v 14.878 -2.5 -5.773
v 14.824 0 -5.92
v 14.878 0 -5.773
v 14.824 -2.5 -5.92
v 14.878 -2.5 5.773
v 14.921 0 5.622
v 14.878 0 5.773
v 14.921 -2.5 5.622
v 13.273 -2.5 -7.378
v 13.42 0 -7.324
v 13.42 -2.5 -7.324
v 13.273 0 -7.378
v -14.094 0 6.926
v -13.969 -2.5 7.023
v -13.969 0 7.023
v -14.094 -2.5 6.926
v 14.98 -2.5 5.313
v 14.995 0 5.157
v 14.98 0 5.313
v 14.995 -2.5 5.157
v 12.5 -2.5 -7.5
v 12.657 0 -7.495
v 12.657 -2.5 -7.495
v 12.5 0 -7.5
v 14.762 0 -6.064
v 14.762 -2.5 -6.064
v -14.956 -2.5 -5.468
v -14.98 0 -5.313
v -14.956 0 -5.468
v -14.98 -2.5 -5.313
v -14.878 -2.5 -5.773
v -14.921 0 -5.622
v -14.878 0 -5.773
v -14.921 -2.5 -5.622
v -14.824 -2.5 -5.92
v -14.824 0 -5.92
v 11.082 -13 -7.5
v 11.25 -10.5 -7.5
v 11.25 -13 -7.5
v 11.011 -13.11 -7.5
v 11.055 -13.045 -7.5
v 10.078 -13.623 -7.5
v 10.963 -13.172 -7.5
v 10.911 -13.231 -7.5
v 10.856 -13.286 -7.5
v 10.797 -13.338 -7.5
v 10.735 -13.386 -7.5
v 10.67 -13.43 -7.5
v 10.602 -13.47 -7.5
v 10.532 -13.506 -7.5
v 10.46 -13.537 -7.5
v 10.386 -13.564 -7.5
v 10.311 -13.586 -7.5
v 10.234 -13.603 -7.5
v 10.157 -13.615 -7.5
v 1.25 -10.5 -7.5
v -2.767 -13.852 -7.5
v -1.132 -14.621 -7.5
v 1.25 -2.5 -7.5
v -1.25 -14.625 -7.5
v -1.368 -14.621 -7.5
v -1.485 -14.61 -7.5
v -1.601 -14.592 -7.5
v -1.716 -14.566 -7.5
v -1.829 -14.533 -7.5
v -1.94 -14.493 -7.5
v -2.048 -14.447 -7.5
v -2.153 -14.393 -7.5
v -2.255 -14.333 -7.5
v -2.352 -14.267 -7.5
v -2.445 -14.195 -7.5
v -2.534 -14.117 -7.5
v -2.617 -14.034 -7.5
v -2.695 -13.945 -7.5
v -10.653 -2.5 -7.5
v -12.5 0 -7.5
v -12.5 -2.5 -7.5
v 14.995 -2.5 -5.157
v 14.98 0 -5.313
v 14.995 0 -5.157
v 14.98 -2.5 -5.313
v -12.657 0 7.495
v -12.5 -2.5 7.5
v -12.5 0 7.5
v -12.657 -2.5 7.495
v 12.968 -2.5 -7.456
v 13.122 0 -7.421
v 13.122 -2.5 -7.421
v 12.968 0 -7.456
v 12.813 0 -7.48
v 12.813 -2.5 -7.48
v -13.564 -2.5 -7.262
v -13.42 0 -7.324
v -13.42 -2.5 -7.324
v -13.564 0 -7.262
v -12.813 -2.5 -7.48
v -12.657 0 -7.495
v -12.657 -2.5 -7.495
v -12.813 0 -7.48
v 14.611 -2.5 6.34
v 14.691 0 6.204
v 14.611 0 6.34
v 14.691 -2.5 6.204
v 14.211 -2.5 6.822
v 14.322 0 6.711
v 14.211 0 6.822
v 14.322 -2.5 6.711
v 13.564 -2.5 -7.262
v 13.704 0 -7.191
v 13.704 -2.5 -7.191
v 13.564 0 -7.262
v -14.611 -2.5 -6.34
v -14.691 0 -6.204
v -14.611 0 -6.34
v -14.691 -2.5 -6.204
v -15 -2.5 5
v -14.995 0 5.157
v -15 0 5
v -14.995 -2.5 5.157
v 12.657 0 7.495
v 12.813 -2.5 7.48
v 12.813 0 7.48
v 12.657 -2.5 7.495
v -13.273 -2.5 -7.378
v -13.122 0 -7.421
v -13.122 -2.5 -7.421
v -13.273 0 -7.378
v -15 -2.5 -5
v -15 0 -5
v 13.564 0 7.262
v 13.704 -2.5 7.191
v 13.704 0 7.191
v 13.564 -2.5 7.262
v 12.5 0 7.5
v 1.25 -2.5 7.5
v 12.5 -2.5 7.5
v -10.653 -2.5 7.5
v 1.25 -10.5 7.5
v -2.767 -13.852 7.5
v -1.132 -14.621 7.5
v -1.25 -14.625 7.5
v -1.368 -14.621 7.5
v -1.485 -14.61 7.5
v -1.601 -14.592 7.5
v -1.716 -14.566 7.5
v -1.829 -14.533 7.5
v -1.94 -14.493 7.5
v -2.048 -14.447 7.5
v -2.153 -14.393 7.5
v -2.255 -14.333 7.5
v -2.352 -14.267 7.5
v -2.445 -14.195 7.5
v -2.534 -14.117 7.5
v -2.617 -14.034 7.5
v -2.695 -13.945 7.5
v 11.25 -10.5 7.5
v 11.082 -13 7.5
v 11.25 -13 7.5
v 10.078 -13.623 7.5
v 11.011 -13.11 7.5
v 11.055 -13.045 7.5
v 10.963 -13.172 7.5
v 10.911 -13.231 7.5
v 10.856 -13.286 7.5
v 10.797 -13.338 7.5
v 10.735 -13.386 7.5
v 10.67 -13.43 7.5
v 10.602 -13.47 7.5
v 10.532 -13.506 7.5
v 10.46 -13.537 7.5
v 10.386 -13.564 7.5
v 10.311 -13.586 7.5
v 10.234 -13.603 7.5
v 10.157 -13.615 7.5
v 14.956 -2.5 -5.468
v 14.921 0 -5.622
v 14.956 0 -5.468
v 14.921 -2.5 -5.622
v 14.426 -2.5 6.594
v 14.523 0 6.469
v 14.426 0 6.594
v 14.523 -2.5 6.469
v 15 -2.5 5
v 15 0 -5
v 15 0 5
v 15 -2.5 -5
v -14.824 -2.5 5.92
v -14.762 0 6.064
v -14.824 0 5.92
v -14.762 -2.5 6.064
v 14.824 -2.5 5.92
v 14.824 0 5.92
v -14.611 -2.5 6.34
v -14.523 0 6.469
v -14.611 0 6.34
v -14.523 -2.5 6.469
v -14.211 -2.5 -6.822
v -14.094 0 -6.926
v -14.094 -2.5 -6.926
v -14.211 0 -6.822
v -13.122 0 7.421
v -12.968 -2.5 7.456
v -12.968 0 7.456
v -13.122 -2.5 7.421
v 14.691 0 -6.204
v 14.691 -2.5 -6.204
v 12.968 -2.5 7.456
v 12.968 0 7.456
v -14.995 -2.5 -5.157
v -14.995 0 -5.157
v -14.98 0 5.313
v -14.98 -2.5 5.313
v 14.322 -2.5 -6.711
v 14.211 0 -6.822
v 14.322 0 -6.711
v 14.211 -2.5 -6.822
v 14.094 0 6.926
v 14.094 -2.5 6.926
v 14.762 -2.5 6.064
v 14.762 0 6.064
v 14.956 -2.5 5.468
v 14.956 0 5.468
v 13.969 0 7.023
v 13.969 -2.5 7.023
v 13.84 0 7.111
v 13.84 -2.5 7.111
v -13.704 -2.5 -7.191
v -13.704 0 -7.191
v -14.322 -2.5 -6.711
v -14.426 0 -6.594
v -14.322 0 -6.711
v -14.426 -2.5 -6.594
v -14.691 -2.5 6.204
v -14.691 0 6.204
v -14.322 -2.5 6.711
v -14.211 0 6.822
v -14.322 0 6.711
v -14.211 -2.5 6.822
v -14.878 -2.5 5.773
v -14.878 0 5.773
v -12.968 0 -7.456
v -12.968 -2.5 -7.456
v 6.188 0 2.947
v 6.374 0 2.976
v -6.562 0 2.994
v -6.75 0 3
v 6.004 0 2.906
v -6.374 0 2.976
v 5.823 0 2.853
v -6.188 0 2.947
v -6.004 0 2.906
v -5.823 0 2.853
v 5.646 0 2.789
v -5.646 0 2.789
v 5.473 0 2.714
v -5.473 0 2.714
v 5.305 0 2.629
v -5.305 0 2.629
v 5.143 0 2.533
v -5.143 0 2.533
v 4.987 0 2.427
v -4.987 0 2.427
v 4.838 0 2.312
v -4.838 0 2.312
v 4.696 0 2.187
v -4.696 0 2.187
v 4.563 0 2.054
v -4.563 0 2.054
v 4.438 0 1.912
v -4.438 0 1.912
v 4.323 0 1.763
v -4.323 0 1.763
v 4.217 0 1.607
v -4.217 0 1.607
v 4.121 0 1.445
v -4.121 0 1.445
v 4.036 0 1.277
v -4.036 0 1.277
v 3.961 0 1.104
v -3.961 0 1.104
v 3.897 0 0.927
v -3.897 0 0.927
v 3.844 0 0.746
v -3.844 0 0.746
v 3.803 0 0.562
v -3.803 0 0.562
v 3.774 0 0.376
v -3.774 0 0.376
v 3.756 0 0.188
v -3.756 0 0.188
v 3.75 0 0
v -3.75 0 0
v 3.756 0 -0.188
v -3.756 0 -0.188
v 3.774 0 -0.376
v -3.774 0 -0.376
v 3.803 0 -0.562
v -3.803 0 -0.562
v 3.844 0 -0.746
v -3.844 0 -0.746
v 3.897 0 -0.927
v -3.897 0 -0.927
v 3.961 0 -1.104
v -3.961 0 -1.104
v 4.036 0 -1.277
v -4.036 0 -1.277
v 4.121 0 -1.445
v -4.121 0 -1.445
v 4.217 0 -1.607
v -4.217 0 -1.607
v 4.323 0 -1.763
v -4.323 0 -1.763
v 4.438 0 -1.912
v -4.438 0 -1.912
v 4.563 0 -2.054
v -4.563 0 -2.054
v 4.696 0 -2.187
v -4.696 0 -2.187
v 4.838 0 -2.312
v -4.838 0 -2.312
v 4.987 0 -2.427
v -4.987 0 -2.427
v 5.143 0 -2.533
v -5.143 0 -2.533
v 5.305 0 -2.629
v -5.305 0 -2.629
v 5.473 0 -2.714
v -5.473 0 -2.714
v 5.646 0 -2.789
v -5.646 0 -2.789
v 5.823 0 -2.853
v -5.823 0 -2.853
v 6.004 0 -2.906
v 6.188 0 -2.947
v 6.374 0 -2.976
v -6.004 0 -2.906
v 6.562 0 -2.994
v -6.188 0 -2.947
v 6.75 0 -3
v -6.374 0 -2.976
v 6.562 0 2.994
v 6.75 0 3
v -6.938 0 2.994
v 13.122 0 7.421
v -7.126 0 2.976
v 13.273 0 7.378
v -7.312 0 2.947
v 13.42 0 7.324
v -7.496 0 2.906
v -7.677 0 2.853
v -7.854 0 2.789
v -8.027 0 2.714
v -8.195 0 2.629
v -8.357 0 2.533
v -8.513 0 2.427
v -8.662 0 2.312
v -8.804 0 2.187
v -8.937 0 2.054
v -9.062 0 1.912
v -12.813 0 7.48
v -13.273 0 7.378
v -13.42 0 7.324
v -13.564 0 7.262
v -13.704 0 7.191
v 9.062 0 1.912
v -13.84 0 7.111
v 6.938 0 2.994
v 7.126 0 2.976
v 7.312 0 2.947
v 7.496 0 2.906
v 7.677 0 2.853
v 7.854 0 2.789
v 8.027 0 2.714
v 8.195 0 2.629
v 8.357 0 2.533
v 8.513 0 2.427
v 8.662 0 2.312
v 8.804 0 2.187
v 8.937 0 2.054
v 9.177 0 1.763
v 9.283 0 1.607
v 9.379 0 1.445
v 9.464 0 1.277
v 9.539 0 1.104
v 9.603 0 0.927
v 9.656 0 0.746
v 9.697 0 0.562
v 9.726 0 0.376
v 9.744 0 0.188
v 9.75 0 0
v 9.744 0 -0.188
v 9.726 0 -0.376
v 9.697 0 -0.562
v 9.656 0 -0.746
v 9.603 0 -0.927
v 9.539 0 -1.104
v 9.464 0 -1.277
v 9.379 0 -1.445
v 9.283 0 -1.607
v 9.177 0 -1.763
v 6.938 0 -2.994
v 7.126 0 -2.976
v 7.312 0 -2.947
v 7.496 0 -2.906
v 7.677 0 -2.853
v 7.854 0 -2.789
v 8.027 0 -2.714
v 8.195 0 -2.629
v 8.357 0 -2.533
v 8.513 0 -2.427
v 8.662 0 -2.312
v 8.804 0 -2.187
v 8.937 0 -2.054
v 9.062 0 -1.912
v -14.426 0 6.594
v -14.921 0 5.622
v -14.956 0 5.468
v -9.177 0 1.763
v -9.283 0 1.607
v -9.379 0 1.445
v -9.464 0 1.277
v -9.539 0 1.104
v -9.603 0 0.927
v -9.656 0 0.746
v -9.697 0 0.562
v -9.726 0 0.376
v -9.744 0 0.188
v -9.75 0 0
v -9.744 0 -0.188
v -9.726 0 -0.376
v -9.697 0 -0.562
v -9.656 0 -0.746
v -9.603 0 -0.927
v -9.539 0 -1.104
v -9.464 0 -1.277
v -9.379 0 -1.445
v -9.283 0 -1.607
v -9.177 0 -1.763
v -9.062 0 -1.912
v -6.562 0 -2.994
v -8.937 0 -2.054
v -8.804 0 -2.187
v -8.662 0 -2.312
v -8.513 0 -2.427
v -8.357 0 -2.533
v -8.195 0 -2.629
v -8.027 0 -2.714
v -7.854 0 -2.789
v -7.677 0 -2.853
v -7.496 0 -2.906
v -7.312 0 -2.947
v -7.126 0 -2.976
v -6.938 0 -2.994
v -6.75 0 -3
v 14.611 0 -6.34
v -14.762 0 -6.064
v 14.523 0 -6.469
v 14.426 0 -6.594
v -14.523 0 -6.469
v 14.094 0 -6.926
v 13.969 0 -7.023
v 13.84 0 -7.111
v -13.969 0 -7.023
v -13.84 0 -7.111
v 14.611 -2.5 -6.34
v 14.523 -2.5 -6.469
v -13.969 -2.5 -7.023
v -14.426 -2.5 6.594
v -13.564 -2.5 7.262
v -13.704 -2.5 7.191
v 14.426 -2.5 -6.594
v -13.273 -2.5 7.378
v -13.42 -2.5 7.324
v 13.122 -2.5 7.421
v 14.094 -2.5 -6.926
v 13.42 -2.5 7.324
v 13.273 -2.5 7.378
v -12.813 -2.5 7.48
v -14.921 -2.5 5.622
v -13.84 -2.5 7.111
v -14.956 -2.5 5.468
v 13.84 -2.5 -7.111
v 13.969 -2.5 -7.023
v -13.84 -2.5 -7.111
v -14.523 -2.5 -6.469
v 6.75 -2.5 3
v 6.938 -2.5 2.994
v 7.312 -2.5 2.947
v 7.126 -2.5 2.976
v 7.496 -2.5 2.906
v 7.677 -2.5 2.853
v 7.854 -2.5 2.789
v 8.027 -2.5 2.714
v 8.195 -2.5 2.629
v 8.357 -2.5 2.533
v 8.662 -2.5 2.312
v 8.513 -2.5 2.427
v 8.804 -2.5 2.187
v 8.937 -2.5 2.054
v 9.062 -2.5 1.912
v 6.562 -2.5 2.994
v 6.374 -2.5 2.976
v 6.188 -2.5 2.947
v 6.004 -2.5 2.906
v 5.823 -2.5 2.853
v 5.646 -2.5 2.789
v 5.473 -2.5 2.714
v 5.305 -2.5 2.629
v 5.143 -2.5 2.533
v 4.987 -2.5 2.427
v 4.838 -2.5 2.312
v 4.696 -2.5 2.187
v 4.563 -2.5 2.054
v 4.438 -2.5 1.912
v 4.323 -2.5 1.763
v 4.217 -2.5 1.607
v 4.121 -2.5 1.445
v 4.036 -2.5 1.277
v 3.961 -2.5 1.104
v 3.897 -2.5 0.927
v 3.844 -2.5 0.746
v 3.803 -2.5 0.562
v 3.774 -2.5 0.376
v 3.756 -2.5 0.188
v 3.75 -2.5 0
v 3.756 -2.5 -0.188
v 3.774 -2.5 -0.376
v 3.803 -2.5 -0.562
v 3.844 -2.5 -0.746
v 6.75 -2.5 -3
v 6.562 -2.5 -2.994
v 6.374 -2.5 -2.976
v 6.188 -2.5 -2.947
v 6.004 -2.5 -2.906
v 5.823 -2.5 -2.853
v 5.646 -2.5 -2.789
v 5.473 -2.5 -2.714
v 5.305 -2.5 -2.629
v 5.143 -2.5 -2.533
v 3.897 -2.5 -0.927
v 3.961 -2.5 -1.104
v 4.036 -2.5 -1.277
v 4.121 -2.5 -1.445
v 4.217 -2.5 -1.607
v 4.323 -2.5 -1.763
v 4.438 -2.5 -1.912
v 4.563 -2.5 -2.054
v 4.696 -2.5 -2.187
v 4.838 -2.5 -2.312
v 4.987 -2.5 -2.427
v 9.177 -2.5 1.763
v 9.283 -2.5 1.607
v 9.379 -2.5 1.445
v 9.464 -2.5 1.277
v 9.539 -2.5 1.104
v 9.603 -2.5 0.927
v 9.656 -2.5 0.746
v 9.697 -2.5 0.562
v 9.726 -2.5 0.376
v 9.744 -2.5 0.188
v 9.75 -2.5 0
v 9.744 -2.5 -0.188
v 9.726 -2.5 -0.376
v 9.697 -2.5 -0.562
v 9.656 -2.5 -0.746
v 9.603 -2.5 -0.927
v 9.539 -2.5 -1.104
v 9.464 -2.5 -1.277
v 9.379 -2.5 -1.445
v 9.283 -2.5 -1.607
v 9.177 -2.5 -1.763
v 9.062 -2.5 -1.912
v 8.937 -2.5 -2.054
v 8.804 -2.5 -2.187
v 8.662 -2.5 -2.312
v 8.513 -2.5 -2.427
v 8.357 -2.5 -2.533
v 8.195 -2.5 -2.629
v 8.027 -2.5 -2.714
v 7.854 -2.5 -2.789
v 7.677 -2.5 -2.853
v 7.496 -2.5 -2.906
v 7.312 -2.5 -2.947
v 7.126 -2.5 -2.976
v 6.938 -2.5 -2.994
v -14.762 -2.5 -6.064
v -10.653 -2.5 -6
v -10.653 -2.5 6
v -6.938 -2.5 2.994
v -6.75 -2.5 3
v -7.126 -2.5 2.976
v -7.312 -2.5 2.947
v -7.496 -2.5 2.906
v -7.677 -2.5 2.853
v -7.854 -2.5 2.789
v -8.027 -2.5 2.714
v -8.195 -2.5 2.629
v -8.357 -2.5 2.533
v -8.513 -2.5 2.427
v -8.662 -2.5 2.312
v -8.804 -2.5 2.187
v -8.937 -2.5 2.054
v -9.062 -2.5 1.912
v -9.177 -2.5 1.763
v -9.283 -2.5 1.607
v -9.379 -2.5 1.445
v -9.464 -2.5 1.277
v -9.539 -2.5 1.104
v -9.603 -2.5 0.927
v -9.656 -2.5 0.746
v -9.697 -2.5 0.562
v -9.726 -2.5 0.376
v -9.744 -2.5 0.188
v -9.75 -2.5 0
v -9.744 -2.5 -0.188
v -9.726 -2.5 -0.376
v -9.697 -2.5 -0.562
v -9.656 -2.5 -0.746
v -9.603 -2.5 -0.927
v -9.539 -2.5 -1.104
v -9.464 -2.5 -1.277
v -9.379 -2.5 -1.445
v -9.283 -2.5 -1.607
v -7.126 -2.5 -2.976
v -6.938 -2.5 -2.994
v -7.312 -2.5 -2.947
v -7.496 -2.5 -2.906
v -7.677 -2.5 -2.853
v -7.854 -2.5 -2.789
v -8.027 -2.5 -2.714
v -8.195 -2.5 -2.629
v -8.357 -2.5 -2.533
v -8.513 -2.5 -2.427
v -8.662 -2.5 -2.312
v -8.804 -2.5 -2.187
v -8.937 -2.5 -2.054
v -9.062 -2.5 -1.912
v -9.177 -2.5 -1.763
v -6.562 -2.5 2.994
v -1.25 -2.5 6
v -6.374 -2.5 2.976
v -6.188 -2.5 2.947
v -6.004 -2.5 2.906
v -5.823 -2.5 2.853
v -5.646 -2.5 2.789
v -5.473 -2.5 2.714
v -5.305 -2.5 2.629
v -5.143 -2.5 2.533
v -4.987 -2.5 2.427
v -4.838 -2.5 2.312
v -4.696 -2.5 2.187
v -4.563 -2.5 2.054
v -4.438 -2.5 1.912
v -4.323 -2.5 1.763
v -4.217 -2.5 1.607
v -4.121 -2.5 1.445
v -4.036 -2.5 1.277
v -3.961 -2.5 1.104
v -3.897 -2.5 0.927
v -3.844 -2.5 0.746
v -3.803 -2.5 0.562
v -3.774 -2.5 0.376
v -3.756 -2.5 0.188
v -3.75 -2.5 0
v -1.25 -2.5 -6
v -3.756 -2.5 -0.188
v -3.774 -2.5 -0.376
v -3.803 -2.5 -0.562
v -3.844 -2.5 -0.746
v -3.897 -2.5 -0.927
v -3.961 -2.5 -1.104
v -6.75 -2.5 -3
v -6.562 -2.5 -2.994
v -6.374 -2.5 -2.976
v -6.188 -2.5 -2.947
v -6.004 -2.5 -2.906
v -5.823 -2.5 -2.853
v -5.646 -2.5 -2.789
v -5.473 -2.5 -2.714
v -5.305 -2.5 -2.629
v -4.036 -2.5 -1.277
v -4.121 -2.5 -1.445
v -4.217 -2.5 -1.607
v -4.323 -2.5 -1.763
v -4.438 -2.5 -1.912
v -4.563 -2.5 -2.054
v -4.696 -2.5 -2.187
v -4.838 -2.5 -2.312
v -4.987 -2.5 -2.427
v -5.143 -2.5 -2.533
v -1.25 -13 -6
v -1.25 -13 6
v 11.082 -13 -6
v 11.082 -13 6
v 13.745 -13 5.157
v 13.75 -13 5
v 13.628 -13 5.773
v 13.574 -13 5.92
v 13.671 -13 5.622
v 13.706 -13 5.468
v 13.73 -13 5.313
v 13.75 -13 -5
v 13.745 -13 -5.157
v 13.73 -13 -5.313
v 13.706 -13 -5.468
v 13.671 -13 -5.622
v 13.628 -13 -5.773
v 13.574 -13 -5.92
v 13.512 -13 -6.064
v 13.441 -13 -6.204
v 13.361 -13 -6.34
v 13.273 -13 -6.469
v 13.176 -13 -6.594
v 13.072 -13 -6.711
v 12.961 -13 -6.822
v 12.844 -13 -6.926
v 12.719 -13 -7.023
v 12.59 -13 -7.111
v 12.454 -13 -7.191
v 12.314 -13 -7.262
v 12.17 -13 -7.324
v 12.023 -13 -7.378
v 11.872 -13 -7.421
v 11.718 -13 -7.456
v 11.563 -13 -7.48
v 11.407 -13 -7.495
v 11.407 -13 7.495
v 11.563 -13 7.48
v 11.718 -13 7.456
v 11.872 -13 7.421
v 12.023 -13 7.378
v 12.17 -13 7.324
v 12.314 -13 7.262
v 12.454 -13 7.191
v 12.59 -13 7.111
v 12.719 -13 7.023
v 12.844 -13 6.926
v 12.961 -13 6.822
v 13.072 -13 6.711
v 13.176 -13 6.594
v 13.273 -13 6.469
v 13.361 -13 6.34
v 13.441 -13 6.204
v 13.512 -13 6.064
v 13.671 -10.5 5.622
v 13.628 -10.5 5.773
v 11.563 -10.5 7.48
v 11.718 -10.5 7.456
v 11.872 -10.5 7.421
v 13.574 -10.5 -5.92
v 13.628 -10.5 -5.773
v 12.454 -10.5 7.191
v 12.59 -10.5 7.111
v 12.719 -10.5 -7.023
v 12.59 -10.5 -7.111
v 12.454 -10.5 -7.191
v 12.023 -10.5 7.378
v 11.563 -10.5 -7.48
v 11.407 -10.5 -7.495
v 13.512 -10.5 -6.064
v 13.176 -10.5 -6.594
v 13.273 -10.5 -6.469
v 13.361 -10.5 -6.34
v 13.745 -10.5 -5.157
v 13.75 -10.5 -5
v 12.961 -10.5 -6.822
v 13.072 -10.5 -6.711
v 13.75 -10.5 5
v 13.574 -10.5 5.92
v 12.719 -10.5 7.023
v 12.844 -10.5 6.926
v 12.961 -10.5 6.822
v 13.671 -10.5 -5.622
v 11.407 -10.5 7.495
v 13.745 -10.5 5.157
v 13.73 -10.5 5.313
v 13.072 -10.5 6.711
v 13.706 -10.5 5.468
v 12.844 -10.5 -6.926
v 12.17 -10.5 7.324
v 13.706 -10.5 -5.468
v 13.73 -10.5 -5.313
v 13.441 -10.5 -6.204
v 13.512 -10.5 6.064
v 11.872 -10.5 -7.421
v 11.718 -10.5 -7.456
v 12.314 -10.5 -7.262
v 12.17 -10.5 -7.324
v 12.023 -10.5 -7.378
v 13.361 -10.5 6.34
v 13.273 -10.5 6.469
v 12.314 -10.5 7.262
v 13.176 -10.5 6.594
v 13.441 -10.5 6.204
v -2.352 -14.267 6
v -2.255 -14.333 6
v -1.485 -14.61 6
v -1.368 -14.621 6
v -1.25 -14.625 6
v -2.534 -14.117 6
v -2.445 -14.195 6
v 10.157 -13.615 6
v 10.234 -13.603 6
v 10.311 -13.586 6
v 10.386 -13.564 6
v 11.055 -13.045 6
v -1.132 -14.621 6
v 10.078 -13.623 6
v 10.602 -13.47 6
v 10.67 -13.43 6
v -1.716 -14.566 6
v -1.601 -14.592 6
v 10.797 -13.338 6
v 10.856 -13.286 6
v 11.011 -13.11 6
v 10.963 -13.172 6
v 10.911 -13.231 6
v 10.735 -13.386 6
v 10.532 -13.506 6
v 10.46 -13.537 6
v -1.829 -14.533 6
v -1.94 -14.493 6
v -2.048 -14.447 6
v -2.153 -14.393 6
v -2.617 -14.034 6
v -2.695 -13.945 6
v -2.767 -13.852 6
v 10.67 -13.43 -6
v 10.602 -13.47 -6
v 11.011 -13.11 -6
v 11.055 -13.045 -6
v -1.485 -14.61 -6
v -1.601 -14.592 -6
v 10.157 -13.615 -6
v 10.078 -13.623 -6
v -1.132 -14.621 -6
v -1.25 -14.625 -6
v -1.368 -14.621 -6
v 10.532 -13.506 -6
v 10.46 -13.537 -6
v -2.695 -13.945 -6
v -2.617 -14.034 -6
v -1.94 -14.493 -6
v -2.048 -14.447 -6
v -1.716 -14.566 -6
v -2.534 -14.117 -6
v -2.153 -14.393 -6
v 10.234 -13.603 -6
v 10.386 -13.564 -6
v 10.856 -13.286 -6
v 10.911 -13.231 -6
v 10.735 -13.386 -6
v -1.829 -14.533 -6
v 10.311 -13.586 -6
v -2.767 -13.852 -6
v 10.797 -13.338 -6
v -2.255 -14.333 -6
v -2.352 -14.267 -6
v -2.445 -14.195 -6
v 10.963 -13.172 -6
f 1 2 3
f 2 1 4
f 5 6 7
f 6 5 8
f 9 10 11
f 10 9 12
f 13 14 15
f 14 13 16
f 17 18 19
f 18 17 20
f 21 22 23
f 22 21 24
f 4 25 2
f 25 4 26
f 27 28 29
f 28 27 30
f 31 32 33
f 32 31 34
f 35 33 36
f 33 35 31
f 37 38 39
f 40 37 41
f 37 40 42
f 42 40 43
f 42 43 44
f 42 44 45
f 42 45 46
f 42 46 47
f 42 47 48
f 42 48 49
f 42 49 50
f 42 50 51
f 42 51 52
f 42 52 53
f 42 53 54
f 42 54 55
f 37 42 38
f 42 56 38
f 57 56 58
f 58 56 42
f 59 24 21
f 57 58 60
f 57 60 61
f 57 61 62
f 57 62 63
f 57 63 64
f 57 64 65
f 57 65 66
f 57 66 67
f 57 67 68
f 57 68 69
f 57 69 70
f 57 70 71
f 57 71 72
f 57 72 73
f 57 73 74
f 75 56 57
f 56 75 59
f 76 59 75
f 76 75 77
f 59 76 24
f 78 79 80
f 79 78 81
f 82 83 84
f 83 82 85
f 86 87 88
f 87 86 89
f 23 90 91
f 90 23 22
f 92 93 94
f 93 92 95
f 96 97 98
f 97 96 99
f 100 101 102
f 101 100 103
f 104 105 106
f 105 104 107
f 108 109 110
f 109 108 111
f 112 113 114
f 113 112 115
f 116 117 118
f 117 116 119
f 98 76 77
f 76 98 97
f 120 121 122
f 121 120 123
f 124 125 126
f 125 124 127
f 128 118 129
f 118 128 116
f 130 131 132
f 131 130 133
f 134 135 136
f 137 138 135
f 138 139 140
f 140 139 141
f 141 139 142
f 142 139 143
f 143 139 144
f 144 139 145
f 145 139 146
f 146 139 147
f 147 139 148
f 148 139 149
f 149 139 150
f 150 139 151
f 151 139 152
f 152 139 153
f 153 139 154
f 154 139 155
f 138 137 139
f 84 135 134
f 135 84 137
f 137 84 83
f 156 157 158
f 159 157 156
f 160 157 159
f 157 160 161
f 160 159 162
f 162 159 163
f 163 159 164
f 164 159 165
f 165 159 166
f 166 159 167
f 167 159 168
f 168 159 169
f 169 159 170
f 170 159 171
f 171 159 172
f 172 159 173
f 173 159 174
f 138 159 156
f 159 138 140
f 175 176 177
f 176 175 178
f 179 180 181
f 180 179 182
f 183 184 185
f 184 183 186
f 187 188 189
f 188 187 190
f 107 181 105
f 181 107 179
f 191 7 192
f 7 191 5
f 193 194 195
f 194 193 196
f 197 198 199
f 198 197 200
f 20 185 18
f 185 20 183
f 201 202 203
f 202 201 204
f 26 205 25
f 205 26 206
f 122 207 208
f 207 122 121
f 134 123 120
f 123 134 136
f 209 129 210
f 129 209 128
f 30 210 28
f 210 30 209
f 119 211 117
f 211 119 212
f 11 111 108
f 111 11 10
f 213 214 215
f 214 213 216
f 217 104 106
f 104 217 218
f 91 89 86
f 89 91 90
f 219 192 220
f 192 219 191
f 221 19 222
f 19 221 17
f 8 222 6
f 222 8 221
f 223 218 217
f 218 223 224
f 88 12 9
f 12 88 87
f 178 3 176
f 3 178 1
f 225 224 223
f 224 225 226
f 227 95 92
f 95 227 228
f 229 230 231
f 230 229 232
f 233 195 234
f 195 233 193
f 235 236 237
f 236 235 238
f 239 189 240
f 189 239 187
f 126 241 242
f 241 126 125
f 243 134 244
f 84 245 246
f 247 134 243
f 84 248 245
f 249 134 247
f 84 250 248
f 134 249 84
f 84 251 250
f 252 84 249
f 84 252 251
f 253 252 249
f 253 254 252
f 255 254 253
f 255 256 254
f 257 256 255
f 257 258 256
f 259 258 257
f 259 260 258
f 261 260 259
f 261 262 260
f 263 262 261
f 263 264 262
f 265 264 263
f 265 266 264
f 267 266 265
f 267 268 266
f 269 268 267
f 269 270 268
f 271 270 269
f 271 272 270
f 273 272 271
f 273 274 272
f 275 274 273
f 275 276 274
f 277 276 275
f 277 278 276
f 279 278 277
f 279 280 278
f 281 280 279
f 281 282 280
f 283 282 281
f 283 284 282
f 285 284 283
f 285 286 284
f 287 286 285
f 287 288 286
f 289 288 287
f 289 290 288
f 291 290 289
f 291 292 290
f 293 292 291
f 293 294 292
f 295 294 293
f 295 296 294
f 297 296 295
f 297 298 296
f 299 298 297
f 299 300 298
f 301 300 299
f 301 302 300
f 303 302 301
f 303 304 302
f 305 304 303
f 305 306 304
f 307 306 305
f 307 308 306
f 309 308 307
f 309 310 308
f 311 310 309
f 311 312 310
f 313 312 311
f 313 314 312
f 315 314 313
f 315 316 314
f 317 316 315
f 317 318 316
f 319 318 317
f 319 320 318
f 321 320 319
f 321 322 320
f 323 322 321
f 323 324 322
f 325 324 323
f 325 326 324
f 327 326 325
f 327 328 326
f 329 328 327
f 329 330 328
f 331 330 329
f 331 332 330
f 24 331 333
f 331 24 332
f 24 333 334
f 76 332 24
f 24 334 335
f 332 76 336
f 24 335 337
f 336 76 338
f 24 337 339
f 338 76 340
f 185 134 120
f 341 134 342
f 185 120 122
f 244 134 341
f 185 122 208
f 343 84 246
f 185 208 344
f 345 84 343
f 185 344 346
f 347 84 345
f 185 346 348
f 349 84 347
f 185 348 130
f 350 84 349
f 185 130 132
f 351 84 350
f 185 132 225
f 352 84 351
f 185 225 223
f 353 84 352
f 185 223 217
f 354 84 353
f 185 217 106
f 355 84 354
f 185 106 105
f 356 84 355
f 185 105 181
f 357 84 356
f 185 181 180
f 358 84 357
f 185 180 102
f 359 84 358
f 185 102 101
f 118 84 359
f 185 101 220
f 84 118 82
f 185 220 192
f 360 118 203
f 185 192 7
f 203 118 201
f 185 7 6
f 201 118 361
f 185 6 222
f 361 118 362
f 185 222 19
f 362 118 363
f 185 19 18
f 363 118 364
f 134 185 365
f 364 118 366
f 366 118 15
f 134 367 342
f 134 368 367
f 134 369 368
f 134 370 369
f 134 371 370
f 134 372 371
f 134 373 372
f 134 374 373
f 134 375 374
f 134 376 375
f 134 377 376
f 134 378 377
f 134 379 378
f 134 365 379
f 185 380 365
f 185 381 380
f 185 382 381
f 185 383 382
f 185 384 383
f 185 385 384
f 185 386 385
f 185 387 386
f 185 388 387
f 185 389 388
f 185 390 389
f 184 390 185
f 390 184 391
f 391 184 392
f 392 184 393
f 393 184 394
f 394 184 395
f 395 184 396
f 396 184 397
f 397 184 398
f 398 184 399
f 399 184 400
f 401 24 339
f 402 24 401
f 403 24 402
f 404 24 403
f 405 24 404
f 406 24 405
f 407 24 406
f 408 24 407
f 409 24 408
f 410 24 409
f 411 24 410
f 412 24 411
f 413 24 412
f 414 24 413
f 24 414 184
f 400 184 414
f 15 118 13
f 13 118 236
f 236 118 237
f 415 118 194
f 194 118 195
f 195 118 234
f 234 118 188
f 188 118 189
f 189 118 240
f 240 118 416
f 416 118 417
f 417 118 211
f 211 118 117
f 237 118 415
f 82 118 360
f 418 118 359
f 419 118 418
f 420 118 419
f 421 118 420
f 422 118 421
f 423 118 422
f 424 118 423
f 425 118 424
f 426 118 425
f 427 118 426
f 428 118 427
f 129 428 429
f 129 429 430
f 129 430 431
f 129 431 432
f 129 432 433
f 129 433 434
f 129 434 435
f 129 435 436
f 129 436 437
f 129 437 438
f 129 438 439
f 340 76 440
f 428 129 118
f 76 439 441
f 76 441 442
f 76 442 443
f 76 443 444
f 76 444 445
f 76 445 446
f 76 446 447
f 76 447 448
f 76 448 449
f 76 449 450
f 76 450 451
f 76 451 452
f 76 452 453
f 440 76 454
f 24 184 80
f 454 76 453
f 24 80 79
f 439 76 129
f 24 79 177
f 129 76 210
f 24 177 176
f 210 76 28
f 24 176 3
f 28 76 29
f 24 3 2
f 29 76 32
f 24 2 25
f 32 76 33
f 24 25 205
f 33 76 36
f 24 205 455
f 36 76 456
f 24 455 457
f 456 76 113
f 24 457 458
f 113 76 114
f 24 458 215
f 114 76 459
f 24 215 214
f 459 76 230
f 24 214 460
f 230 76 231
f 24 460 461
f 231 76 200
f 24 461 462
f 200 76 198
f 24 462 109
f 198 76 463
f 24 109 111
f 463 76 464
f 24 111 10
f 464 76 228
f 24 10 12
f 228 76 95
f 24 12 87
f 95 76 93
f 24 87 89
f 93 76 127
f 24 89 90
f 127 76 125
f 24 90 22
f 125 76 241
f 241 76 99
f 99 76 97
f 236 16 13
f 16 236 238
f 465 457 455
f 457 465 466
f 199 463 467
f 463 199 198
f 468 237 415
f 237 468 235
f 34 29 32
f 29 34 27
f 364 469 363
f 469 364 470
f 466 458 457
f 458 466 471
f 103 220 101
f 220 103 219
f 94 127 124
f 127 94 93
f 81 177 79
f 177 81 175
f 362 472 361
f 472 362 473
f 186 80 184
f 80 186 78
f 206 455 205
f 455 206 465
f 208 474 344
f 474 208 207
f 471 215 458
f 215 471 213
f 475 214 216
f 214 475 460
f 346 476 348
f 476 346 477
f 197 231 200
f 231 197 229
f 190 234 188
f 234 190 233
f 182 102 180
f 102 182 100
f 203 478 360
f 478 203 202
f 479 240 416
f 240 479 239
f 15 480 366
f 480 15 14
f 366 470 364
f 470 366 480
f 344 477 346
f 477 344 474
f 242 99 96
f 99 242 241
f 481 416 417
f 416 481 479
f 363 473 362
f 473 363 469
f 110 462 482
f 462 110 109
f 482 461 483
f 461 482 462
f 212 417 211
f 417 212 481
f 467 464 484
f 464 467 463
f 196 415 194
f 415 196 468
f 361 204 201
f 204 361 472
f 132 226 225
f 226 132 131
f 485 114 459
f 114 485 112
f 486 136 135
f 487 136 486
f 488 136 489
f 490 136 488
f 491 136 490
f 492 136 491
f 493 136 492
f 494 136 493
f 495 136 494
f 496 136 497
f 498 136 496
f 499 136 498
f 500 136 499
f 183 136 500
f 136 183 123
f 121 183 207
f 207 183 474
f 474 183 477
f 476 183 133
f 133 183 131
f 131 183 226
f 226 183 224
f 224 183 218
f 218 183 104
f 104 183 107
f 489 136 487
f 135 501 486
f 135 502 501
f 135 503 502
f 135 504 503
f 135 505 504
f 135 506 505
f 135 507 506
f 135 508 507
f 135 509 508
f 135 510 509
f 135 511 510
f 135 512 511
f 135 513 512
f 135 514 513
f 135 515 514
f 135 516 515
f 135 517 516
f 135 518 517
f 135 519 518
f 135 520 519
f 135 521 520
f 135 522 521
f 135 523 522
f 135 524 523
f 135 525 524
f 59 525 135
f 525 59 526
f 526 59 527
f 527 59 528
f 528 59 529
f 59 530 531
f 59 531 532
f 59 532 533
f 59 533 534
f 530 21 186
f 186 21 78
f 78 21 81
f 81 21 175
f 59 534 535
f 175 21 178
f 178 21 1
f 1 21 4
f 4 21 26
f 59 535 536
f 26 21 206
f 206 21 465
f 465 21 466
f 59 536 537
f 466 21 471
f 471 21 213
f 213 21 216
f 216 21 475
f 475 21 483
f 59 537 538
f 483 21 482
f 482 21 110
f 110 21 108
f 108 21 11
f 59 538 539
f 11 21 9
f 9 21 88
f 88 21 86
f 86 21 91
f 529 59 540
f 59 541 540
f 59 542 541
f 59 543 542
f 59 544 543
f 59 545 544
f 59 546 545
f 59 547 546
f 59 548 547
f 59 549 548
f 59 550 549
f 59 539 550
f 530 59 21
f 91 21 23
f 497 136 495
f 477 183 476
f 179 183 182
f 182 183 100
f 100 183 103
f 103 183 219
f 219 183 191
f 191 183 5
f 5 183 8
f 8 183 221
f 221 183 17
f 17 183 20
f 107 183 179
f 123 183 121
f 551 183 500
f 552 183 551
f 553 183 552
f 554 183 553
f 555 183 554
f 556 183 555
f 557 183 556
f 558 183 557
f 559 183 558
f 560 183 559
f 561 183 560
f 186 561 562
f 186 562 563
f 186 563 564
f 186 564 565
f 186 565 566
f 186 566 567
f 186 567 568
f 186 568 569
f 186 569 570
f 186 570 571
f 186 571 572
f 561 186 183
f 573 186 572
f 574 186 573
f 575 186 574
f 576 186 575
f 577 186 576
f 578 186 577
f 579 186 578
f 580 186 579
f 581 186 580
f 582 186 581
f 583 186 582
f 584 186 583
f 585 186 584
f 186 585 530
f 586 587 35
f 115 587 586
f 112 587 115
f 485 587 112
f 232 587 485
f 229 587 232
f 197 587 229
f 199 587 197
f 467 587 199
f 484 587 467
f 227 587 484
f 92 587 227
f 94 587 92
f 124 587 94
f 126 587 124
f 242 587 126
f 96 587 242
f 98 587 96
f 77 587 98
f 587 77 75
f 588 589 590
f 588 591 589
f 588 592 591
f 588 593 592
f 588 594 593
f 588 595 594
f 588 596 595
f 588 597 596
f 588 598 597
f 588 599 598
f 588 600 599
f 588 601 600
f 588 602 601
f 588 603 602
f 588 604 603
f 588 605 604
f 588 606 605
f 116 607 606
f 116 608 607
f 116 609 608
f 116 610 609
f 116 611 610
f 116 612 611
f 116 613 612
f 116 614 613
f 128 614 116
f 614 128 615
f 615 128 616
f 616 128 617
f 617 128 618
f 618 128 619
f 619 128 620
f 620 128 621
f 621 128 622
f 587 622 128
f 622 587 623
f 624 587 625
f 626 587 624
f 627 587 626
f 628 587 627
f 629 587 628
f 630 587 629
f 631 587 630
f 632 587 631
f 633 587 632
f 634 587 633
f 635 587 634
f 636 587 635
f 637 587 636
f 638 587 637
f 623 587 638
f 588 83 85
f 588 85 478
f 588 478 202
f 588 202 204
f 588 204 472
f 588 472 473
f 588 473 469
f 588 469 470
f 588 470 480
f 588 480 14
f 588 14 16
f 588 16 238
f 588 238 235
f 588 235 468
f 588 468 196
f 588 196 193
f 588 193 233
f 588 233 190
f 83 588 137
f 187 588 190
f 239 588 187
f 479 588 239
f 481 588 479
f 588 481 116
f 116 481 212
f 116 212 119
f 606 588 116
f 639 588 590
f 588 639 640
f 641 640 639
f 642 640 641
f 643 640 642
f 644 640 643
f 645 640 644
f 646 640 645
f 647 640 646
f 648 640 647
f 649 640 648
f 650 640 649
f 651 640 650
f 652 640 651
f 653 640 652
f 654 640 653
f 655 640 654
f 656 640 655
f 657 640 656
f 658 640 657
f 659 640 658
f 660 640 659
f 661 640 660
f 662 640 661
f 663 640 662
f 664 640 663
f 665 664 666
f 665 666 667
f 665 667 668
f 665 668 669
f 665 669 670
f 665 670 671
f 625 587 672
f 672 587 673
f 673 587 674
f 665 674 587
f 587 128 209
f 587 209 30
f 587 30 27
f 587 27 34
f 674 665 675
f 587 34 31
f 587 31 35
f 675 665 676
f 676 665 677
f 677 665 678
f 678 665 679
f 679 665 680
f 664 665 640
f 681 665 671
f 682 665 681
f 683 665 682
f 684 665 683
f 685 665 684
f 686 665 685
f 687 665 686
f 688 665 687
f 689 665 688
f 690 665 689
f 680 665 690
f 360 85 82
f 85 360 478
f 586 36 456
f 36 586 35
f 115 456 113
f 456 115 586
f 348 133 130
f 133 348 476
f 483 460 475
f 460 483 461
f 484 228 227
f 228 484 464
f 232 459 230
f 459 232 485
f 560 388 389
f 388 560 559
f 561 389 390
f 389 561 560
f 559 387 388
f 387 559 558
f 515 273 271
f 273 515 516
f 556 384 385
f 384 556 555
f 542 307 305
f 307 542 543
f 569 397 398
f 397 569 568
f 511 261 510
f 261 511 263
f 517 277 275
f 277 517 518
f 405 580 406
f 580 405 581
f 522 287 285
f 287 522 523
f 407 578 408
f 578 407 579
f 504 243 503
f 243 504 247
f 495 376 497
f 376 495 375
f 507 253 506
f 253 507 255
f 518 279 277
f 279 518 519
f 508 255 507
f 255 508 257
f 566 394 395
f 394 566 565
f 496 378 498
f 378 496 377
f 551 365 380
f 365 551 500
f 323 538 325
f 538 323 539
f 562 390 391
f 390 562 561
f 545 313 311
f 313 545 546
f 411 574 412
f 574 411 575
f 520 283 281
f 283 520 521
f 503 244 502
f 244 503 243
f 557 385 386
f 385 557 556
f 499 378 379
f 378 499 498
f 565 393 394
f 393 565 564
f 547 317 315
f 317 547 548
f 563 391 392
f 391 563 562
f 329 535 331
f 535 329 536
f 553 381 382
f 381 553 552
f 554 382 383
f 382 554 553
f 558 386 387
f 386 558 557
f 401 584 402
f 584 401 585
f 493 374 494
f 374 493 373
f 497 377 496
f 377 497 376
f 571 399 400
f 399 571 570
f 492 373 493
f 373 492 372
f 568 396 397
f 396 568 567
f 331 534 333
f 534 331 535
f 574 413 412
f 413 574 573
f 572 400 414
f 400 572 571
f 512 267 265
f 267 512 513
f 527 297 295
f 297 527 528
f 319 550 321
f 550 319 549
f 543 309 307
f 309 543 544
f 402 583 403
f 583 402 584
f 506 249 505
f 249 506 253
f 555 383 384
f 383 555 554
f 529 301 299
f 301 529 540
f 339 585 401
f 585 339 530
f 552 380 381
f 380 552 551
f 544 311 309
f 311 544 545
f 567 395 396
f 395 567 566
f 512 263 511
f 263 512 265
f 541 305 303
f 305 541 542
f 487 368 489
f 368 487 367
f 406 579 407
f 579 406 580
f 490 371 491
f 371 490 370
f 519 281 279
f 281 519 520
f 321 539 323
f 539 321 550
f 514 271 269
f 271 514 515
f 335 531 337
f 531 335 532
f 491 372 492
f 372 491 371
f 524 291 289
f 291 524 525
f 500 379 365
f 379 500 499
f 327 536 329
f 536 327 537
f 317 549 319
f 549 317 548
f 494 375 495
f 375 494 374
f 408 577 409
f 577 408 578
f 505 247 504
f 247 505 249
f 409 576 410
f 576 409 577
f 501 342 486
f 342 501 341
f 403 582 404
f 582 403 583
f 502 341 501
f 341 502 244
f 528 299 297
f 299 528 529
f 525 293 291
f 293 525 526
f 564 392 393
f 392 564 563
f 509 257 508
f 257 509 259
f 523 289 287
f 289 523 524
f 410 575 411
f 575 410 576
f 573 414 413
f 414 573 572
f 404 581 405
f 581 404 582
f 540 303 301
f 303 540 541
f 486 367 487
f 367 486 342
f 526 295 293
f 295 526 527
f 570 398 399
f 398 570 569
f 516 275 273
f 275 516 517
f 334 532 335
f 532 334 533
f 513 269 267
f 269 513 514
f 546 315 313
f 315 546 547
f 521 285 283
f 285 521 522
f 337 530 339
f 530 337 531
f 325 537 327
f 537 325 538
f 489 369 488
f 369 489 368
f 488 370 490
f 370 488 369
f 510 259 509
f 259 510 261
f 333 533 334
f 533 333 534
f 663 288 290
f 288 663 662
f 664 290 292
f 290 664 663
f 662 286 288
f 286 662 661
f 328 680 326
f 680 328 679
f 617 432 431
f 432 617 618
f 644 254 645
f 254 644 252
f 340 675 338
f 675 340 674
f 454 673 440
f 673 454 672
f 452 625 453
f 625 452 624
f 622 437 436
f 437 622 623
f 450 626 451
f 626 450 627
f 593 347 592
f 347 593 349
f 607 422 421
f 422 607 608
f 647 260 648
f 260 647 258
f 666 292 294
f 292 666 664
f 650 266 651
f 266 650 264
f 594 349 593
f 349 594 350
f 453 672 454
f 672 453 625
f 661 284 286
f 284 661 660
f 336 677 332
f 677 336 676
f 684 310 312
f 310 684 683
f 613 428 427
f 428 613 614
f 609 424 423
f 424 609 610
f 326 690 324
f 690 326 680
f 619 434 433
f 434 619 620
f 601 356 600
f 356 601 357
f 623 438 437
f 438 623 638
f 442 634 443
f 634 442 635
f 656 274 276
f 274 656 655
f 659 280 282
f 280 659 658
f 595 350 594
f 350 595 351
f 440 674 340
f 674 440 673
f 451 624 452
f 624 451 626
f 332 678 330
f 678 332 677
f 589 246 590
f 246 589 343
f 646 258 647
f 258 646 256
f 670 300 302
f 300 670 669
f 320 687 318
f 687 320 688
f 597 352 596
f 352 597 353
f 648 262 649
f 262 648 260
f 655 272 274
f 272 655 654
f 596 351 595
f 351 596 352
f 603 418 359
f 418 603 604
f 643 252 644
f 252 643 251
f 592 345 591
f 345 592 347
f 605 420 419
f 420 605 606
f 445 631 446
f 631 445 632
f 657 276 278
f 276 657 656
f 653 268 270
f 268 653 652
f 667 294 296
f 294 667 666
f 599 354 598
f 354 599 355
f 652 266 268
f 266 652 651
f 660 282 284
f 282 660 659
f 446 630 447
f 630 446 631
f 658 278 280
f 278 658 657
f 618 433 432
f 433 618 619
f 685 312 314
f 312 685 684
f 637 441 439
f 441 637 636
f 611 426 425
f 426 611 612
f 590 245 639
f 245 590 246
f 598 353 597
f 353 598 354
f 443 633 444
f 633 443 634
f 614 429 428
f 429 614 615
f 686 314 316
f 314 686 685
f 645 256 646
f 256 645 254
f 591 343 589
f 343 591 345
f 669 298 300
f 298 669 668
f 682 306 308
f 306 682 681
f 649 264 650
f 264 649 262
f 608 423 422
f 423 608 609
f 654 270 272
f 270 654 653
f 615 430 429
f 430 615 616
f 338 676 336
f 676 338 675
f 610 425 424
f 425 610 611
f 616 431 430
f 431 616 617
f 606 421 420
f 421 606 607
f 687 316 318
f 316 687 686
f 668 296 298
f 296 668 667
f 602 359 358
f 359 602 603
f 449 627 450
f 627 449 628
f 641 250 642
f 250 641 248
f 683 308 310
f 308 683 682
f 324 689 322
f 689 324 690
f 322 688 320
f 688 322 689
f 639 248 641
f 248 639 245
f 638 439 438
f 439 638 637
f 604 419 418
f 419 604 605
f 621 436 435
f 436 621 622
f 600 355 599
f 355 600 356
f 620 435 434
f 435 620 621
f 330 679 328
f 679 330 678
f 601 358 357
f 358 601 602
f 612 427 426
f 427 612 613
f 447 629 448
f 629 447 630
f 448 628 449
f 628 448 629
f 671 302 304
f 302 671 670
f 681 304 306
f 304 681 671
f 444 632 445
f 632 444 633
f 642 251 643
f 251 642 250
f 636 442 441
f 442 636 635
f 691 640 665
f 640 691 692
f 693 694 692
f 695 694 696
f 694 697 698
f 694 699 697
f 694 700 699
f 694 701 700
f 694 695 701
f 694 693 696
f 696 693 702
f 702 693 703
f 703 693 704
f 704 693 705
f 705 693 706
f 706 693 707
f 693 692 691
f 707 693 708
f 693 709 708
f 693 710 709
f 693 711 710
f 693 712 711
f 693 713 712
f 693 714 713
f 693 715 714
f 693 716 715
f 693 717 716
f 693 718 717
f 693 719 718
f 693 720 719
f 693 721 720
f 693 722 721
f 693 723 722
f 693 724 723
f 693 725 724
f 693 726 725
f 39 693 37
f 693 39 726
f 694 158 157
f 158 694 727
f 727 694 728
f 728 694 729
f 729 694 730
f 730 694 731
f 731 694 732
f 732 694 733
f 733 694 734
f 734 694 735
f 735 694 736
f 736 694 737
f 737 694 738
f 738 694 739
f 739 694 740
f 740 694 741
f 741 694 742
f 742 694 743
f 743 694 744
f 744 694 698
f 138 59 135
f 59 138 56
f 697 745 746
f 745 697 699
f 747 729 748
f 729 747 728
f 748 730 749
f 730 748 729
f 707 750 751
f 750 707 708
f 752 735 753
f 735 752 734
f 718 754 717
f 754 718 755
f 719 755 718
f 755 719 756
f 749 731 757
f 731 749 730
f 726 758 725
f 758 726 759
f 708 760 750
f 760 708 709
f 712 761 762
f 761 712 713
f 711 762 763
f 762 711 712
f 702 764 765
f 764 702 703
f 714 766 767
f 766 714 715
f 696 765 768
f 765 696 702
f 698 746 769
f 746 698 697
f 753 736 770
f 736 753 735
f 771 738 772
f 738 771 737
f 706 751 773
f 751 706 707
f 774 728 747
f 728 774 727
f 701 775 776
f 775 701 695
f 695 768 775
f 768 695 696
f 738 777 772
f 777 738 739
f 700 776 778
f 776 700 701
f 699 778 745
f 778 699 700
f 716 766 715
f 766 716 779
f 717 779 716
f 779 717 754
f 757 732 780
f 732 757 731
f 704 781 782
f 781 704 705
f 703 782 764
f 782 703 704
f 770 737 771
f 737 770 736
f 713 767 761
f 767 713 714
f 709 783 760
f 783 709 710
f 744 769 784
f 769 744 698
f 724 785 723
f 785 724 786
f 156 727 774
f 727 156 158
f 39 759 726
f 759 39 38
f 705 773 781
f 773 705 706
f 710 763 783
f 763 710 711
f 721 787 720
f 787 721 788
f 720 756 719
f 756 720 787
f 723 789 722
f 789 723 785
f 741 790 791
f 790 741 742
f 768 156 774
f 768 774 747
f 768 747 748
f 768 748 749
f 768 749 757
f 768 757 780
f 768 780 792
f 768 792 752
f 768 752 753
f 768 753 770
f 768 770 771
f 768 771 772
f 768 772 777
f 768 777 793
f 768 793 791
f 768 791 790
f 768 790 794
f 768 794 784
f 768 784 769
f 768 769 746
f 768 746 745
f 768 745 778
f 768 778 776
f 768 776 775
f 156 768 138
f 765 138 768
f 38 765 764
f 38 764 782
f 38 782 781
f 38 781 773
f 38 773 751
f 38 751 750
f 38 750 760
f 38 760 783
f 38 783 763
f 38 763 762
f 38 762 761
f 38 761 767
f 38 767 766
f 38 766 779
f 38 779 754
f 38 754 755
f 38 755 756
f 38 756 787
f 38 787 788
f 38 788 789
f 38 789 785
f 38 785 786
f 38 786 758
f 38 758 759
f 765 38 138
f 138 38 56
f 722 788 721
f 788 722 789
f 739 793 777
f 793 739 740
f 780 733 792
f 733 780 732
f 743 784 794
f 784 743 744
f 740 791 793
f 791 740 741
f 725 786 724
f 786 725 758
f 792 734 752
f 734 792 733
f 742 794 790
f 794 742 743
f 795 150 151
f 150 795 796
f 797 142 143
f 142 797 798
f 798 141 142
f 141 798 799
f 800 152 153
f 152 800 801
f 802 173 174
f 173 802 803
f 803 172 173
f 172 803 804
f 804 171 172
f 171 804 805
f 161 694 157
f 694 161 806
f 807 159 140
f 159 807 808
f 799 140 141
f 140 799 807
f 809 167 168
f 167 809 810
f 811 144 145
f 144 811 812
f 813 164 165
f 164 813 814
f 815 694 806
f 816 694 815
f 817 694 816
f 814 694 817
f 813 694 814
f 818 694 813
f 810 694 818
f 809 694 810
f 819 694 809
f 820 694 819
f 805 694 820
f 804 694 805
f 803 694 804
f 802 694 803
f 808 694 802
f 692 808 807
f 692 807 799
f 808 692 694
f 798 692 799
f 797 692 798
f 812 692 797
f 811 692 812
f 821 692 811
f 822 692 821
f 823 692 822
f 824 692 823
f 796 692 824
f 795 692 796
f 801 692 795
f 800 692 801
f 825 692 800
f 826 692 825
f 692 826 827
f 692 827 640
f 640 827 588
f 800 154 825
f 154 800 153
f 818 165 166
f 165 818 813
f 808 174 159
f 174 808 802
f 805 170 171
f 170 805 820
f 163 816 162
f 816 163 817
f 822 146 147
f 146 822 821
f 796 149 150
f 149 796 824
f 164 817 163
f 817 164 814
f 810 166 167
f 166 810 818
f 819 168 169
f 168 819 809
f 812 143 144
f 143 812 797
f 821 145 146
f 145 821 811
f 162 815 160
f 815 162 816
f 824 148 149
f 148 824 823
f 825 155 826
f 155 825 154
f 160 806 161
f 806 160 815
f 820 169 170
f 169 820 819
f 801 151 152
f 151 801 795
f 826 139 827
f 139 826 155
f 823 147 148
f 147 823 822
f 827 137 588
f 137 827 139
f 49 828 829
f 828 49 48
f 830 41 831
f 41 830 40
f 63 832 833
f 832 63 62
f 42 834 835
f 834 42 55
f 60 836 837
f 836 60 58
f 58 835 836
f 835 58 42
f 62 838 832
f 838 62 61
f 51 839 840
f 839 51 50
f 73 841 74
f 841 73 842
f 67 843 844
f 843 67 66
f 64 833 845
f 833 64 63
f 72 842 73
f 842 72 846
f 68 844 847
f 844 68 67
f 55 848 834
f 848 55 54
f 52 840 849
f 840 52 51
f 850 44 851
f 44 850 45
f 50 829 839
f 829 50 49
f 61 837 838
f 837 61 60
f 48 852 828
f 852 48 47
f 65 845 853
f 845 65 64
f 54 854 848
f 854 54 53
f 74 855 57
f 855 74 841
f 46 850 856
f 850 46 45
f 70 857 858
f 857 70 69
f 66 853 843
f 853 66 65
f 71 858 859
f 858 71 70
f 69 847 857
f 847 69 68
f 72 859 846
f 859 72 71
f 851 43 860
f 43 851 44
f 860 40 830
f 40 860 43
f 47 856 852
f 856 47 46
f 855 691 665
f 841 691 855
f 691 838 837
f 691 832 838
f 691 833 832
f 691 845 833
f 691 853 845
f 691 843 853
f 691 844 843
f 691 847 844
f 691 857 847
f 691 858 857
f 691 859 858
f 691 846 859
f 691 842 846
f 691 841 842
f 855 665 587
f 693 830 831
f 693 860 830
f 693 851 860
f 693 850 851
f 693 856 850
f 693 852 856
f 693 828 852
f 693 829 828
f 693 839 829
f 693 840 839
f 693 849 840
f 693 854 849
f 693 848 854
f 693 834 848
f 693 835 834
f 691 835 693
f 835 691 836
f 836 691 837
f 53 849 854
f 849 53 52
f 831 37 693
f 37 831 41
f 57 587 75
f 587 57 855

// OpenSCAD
rotate([90,0,0])
union(){
thick = 2.5;
//base
difference(){
    linear_extrude(thick) minkowski(){
        cRad = 5;
        square(size = [30-cRad,15-cRad],
               center = true);
        circle(d=cRad, $fn=100);
    }
    translate([6.75,0,0])
    cylinder(h = 6, d = 6, $fn = 100);
    
    translate([-6.75,0,0])
    cylinder(h = 6, d = 6, $fn = 100);
}


//clippy
linear_extrude(13){
    square(size = [thick,15],
           center = true);
}

translate([7.5-thick/2,0,13-thick])
linear_extrude(thick)
minkowski(){
    di = 5;
    square(size = [15-di,15-di], center=true);
    circle(d=di, $fn=100);
}

//clippy flange north
hull()
{
    translate([10,6.75,13-thick/4])
    rotate([90,0,0])
    cylinder(h = 1.5, d = thick, $fn=100, center = true);

    translate([-thick/2,6.75,14-thick/2])
    rotate([90,0,0])
    cylinder(h = 1.5, r = thick*.75, $fn=100, center = true);
}

hull(){
    translate([-thick/2,6.75,14-thick/2])
    rotate([90,0,0])
    cylinder(h = 1.5, r = thick*.75, $fn=100, center = true);
    
    translate([-10,6.75,thick/2])
    rotate([90,0,0])
    cylinder(h = 1.5, d = thick, $fn=100, center = true);
    
    translate([0,6.75,thick/2])
    rotate([90,0,0])
    cylinder(h = 1.5, d = thick, $fn=100, center = true);
}

//clippy flange south
hull()
{
    translate([10,-6.75,13-thick/4])
    rotate([90,0,0])
    cylinder(h = 1.5, d = thick, $fn=100, center = true);

    translate([-thick/2,-6.75,14-thick/2])
    rotate([90,0,0])
    cylinder(h = 1.5, r = thick*.75, $fn=100, center = true);
}

hull(){
    translate([-thick/2,-6.75,14-thick/2])
    rotate([90,0,0])
    cylinder(h = 1.5, r = thick*.75, $fn=100, center = true);
    
    translate([-10,-6.75,thick/2])
    rotate([90,0,0])
    cylinder(h = 1.5, d = thick, $fn=100, center = true);
    
    translate([0,-6.75,thick/2])
    rotate([90,0,0])
    cylinder(h = 1.5, d = thick, $fn=100, center = true);
}
}



//translate([6.75,0,2]) cylinder(h = 3, d = 10, $fn = 100);
